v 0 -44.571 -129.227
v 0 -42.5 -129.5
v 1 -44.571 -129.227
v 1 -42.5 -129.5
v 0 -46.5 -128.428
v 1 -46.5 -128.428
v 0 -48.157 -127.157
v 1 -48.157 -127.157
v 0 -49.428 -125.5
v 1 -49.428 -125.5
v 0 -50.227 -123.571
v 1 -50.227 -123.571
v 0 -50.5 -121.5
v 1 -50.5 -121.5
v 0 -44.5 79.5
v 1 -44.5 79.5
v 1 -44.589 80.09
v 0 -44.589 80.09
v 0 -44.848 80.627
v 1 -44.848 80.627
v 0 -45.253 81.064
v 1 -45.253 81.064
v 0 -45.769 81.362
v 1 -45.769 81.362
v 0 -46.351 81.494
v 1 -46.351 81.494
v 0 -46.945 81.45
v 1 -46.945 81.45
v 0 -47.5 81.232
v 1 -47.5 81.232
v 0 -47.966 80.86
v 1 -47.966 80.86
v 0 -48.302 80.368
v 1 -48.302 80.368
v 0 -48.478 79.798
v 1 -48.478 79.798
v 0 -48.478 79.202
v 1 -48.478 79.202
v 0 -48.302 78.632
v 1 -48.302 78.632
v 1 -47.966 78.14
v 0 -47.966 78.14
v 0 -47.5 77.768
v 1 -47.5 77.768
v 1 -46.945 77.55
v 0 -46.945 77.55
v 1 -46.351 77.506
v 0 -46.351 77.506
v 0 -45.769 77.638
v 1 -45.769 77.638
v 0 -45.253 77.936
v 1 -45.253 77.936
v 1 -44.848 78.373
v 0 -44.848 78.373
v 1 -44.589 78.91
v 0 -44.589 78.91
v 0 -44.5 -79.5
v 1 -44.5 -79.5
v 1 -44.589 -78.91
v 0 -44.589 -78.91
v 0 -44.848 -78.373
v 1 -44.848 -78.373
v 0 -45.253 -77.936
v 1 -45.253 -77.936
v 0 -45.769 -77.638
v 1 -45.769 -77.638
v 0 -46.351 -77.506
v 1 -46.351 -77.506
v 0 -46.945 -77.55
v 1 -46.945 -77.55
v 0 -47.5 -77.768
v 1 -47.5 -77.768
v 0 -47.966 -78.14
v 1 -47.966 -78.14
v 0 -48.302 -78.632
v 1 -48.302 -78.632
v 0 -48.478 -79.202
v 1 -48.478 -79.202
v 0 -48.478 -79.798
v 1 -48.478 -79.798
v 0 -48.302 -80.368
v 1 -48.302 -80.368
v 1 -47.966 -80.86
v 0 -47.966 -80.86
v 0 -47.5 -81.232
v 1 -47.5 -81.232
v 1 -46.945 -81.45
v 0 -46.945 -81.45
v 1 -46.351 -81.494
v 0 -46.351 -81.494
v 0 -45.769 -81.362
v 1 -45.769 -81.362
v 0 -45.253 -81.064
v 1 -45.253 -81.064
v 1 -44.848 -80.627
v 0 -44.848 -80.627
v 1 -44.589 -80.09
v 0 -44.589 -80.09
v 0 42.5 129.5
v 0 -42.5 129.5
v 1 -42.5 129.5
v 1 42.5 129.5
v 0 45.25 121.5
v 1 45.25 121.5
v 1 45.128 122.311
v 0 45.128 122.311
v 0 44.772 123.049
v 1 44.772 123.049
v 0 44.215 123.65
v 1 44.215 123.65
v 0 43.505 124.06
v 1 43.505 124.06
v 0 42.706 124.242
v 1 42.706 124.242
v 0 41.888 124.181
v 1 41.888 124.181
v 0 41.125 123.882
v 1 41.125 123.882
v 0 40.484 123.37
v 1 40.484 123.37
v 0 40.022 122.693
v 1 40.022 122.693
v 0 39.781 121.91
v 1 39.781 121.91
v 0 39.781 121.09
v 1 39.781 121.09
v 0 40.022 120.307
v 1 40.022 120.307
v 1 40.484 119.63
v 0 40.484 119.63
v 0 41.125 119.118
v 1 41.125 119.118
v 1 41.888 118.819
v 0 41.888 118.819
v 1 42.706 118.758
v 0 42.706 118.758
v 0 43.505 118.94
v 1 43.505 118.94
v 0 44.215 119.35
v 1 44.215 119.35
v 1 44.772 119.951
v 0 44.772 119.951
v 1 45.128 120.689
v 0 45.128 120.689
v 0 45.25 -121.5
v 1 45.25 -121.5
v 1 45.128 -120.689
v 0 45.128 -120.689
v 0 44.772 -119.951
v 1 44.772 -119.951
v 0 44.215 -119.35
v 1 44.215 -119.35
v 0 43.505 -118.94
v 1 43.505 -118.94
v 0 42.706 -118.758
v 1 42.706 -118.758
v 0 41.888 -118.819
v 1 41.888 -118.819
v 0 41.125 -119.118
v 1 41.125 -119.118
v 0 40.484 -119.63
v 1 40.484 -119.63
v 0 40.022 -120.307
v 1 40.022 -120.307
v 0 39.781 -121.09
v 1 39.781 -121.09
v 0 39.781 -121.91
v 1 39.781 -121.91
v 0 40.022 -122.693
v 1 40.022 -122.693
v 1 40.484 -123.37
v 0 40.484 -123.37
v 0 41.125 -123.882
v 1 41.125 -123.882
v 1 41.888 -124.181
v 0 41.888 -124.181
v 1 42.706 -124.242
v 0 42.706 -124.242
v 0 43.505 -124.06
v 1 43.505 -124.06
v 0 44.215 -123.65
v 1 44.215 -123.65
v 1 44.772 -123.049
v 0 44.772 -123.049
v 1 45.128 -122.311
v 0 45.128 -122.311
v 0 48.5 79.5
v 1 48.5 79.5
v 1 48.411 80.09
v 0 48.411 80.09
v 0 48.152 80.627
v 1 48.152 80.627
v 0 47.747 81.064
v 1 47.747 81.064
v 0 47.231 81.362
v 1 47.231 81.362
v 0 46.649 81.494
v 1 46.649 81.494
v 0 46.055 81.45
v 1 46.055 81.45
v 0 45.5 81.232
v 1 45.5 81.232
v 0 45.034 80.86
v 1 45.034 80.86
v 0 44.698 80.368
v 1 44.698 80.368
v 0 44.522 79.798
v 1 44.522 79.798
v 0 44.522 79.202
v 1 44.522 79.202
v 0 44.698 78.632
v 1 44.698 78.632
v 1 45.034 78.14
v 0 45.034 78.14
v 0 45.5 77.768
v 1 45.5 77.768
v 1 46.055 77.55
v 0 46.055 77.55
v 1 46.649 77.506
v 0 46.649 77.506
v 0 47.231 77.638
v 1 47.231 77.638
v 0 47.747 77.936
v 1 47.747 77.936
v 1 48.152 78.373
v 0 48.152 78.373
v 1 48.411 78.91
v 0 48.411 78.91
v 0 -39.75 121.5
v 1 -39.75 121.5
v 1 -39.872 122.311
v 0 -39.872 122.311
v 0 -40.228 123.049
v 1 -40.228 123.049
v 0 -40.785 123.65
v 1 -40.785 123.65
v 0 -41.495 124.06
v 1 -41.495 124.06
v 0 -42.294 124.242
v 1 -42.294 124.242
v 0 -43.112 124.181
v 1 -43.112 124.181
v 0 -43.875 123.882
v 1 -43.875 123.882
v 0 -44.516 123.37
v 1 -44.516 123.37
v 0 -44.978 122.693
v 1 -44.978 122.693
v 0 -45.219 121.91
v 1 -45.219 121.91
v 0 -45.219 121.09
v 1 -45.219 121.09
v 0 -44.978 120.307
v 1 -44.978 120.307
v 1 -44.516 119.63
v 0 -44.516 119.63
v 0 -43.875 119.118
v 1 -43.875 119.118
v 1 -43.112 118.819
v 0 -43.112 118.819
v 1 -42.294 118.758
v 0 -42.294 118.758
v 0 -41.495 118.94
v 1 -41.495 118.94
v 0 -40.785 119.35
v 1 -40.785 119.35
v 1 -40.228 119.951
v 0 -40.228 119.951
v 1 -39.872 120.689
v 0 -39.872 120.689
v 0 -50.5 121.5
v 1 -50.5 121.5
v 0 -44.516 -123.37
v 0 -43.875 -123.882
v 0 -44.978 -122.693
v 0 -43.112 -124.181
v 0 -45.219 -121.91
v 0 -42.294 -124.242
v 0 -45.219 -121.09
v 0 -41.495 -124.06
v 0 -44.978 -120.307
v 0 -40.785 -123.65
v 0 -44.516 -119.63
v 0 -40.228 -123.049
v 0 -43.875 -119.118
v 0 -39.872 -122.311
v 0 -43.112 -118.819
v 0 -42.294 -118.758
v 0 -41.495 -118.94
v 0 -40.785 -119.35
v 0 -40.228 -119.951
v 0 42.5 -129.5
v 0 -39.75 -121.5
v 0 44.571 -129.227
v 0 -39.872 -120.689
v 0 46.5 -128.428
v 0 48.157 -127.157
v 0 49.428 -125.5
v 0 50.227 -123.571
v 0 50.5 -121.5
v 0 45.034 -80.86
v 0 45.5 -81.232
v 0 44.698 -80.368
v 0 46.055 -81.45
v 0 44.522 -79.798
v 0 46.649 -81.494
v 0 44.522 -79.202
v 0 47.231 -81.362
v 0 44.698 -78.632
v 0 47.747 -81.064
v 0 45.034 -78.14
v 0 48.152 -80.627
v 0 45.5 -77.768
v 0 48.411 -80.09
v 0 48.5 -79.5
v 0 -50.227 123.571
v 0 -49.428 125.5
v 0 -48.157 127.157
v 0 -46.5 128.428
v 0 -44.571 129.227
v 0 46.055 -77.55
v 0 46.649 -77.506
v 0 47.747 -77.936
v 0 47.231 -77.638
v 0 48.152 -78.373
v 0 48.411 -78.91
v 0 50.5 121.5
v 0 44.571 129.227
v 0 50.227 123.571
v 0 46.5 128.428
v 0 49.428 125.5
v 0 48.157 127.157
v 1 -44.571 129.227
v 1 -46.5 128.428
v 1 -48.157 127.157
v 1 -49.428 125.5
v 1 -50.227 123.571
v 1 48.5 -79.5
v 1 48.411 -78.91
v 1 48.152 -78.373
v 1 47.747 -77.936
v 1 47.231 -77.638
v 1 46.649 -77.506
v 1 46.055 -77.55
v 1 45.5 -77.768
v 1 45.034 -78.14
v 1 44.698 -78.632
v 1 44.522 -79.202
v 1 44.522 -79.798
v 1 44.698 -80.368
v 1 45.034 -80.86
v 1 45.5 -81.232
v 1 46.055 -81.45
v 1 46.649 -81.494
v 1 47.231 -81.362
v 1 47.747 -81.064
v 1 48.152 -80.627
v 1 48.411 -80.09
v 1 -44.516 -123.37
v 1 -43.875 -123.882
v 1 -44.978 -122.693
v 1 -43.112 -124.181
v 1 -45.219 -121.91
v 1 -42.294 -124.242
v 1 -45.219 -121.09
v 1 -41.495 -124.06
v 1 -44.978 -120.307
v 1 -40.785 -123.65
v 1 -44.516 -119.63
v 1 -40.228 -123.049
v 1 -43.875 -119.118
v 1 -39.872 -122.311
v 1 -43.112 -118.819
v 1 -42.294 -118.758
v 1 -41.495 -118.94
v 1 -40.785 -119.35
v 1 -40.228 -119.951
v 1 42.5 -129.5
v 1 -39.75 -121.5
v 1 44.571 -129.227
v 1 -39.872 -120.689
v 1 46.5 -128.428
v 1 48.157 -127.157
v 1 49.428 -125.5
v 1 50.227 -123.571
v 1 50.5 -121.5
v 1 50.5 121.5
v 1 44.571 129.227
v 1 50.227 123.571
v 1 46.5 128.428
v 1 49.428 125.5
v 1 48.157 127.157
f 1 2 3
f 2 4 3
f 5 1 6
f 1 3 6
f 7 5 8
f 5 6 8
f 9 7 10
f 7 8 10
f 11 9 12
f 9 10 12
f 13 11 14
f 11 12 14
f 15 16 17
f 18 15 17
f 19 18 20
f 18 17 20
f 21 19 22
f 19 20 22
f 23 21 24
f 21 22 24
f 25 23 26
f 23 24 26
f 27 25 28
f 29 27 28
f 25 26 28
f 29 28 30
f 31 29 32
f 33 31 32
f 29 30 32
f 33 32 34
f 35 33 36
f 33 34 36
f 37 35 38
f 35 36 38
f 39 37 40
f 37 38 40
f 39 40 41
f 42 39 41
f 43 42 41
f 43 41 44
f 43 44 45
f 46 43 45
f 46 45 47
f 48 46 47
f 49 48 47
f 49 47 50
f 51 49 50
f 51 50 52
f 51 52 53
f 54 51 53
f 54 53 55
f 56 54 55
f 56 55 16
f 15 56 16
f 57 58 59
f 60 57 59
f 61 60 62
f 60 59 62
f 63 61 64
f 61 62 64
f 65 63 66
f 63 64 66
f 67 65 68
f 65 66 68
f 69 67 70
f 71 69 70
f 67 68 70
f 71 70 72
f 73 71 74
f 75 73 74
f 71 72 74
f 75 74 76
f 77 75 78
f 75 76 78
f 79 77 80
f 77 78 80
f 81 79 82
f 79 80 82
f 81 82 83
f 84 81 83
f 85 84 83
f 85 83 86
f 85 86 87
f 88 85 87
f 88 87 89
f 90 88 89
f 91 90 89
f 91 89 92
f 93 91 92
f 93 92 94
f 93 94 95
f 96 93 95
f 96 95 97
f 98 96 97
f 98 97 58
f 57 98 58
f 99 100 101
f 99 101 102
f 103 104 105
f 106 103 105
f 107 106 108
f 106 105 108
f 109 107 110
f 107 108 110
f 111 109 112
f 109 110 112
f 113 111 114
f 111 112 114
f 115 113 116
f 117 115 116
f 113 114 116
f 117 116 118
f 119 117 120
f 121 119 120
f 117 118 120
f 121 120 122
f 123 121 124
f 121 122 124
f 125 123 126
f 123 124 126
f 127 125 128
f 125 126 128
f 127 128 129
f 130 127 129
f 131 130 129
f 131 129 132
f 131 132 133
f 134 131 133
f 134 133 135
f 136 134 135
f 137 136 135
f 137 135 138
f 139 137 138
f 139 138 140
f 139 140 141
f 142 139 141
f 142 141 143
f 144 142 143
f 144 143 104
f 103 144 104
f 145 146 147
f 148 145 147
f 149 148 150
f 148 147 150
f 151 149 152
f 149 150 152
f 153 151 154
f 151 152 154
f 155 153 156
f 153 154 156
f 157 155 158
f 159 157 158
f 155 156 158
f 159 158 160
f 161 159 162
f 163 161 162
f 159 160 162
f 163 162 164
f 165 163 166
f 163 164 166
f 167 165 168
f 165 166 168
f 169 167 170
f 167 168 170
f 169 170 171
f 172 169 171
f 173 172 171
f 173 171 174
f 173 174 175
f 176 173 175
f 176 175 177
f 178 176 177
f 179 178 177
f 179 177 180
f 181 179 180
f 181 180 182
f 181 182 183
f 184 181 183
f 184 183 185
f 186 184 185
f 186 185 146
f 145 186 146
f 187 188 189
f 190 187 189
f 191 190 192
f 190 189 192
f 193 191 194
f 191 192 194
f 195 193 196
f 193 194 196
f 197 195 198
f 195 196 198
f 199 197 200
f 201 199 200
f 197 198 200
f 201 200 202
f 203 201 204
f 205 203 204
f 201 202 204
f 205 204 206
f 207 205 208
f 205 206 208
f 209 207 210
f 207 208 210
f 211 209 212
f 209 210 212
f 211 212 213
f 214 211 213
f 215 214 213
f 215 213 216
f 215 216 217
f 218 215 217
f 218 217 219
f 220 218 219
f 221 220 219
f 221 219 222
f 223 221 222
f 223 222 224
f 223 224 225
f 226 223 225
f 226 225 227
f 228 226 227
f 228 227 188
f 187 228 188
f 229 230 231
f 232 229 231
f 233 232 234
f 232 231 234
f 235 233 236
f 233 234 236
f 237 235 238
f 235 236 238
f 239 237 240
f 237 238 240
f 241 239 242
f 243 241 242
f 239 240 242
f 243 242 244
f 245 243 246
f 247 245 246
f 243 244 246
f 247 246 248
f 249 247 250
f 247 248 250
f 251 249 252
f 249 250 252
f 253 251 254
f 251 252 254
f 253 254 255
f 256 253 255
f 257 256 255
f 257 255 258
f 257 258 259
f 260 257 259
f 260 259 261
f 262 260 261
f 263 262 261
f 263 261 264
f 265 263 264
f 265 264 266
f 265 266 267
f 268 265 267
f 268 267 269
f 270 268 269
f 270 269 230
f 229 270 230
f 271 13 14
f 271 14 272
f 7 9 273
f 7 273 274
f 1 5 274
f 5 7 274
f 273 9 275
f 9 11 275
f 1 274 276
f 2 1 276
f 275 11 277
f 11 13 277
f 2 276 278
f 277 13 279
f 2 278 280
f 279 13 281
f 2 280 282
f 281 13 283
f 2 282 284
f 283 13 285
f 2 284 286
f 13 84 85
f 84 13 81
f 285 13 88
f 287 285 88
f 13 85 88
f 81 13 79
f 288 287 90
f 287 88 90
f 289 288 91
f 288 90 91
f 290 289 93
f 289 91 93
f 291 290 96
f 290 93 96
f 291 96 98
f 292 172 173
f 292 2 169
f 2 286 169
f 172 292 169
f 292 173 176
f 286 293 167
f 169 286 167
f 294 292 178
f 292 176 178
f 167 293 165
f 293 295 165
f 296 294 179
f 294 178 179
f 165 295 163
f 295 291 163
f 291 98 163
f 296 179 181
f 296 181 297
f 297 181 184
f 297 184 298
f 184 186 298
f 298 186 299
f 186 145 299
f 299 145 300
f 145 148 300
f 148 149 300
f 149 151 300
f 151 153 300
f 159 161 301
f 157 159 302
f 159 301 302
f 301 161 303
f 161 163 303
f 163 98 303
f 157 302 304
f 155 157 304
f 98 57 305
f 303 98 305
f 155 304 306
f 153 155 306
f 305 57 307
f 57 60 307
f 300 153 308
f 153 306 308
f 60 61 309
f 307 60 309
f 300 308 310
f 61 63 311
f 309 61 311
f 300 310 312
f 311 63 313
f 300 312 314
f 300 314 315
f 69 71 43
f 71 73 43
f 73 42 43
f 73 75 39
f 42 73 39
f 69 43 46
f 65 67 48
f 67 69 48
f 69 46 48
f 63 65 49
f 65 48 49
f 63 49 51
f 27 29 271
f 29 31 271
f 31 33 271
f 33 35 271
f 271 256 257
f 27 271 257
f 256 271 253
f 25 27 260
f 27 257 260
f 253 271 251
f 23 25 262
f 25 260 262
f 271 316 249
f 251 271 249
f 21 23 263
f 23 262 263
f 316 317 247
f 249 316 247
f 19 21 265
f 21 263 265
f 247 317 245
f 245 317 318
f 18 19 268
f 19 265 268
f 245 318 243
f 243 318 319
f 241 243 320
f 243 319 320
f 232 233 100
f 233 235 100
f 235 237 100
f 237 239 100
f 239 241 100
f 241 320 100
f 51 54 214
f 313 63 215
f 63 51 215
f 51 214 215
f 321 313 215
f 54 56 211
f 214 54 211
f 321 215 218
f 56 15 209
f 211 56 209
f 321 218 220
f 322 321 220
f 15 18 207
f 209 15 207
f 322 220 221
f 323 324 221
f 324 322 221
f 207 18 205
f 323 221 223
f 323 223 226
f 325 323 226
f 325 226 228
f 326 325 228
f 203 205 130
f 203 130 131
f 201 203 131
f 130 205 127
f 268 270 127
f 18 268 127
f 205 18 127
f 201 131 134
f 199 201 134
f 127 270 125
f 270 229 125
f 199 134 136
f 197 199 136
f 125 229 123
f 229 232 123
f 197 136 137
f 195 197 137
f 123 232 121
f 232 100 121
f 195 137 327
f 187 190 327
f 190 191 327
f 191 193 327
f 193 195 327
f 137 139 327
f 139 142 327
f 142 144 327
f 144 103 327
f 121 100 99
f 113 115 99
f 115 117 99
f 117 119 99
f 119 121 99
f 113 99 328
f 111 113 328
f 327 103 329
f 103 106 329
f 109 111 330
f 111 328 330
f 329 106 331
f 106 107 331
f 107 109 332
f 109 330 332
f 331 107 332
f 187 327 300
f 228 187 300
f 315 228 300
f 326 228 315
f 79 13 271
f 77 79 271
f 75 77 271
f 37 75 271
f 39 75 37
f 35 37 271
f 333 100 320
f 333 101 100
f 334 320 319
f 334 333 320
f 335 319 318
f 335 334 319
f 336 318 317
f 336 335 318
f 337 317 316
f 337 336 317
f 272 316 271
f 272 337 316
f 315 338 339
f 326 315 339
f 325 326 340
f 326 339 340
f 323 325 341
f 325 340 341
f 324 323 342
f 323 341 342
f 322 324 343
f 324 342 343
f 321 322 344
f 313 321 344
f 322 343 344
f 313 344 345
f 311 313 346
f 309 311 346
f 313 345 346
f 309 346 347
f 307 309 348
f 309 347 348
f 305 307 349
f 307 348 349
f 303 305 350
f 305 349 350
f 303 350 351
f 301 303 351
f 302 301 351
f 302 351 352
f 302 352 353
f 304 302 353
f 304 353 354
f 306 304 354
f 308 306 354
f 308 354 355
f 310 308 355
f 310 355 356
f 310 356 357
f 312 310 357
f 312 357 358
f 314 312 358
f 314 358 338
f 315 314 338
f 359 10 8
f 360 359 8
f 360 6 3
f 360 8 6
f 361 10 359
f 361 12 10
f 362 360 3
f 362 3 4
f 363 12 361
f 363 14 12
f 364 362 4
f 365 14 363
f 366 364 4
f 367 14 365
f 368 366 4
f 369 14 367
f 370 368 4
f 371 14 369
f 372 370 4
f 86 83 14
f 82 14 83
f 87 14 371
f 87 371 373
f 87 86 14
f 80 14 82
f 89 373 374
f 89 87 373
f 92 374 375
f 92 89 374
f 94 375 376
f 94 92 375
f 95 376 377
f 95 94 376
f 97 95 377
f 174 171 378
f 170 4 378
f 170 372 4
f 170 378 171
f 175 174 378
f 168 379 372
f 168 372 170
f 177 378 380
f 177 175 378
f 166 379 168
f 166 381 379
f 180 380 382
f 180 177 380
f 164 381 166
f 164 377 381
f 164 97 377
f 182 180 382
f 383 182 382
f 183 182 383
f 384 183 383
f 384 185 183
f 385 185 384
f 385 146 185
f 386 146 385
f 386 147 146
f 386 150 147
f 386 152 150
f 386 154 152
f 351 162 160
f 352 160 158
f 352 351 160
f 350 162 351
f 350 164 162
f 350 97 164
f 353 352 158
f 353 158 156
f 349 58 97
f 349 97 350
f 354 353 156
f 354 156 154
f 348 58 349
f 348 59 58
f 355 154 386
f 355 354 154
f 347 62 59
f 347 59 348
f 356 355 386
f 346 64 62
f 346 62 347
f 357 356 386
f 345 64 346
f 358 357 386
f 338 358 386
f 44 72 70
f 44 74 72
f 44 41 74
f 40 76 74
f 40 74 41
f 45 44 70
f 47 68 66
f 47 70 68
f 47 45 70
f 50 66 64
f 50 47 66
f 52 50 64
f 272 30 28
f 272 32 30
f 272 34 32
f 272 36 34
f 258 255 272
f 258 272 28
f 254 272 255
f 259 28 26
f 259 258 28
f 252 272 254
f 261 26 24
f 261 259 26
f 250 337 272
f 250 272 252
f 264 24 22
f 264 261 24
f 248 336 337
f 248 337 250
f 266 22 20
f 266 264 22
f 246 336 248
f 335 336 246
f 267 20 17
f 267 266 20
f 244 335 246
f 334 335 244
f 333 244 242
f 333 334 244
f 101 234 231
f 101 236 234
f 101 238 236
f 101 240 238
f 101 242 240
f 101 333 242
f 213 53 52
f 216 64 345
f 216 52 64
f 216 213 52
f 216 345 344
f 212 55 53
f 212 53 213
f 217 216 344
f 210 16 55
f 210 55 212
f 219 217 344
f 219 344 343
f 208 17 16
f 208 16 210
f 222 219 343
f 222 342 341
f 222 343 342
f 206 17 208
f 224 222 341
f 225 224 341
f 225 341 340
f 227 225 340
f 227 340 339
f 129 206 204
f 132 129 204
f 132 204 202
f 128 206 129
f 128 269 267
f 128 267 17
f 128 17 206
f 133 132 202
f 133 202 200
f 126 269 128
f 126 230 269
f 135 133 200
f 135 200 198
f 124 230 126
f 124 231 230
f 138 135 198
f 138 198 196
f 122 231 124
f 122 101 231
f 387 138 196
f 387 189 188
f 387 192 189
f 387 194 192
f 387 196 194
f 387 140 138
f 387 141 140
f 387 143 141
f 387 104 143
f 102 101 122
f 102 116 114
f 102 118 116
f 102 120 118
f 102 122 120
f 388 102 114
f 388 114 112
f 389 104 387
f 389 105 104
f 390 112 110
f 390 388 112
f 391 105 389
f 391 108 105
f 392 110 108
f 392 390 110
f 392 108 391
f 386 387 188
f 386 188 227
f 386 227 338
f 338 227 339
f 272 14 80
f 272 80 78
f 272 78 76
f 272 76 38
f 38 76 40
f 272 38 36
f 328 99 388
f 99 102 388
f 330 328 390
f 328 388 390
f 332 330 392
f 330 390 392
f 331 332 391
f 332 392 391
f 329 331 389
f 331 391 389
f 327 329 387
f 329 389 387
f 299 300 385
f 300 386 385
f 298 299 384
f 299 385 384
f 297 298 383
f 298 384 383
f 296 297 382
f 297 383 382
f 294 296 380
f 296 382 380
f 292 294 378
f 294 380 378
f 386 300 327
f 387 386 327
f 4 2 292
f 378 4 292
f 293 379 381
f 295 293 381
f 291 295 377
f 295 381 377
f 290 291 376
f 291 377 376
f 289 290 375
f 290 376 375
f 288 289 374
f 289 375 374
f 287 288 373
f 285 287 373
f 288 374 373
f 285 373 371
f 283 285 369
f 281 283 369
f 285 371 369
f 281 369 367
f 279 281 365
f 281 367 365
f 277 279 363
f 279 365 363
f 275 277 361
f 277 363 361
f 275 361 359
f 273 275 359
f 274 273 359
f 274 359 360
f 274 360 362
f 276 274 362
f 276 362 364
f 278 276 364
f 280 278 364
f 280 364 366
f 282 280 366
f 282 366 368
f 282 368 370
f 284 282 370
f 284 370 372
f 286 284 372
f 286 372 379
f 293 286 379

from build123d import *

# Parameters (mm, degrees)
SKETCH_W      = 101
SKETCH_H      = 259
PAD_DEPTH     = 1
SKETCH001_R   = 2.75
SKETCH001_R_2 = 2
POCKET_DEPTH  = 1.001
FILLET_R      = 8
FILLET001_R   = 8
FILLET002_R   = 8
FILLET003_R   = 8


with BuildPart() as part:
    # Sketch → Pad (new body)
    with BuildSketch(Plane.YZ):
        Rectangle(SKETCH_W, SKETCH_H)
    extrude(amount=PAD_DEPTH)

    # Sketch001 (on Face6 of Pad) → Pocket (cut, through all)
    with BuildSketch(Plane.YZ.offset(1)):
        with Locations((42.5, 121.5)):
            Circle(SKETCH001_R)
        with Locations((-42.5, 121.5)):
            Circle(SKETCH001_R)
        with Locations((-42.5, -121.5)):
            Circle(SKETCH001_R)
        with Locations((42.5, -121.5)):
            Circle(SKETCH001_R)
        with Locations((-46.5, 79.5)):
            Circle(SKETCH001_R_2)
        with Locations((46.5, 79.5)):
            Circle(SKETCH001_R_2)
        with Locations((-46.5, -79.5)):
            Circle(SKETCH001_R_2)
        with Locations((46.5, -79.5)):
            Circle(SKETCH001_R_2)
    extrude(amount=-POCKET_DEPTH, mode=Mode.SUBTRACT)

    # Fillet
    fillet_edges = [part.edges().sort_by_distance(p)[0] for p in [
        (0.5, 50.5, 129.5),
    ]]
    fillet(fillet_edges, radius=FILLET_R)

    # Fillet001
    fillet001_edges = [part.edges().sort_by_distance(p)[0] for p in [
        (0.5, -50.5, 129.5),
    ]]
    fillet(fillet001_edges, radius=FILLET001_R)

    # Fillet002
    fillet002_edges = [part.edges().sort_by_distance(p)[0] for p in [
        (0.5, 50.5, -129.5),
    ]]
    fillet(fillet002_edges, radius=FILLET002_R)

    # Fillet003
    fillet003_edges = [part.edges().sort_by_distance(p)[0] for p in [
        (0.5, -50.5, -129.5),
    ]]
    fillet(fillet003_edges, radius=FILLET003_R)


solid = part.part
